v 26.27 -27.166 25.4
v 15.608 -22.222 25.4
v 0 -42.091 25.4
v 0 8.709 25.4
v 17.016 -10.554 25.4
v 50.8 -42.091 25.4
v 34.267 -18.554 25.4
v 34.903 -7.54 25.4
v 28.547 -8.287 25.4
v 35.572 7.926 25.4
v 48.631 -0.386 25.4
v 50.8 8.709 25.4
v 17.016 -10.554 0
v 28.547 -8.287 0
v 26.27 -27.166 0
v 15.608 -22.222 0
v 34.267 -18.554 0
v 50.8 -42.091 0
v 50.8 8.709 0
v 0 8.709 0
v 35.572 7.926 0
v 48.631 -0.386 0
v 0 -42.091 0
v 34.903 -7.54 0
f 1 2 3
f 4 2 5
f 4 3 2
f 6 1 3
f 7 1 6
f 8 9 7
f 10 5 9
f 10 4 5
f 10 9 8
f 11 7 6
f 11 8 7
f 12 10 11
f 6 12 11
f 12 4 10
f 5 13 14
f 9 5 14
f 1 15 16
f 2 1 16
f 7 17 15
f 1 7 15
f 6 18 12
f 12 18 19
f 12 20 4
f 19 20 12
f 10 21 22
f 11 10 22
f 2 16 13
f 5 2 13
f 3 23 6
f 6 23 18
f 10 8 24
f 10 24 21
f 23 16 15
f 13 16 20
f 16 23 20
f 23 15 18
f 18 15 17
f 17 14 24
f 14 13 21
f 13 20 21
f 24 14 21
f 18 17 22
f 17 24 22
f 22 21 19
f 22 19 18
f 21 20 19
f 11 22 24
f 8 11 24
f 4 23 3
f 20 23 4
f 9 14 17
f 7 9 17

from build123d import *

# Parameters (mm, degrees)
F0_W     = 50.8
F0_H     = 50.8
F1_DEPTH = 25.4
F2_DEPTH = 25.4


# Not quite as in the source:
# - a feature names something its author has since deleted; it is built from what else it names


with BuildPart() as f1:
    # F0 (on Top) → F1 (new body)
    with BuildSketch(Plane.XY):
        with Locations((25.4, -16.6914236449)):
            Rectangle(F0_W, F0_H)
        Polygon((28.5474364771, -8.2873642427), (34.2667401254, -18.5540249534), (26.2699275792, -27.1659785919), (15.6083219757, -22.2217979392), (17.0158998843, -10.5541726109), align=None, mode=Mode.SUBTRACT)
        Polygon((35.5715639889, 7.9258885235), (48.6309623563, -0.3860413606), (34.9029207385, -7.5398471628), align=None, mode=Mode.SUBTRACT)
    extrude(amount=F1_DEPTH)

    # F0 (on Top) → F2 (join)
    with BuildSketch(Plane.XY):
        with Locations((25.4, -16.6914236449)):
            Rectangle(F0_W, F0_H)
        Polygon((28.5474364771, -8.2873642427), (34.2667401254, -18.5540249534), (26.2699275792, -27.1659785919), (15.6083219757, -22.2217979392), (17.0158998843, -10.5541726109), align=None, mode=Mode.SUBTRACT)
        Polygon((35.5715639889, 7.9258885235), (48.6309623563, -0.3860413606), (34.9029207385, -7.5398471628), align=None, mode=Mode.SUBTRACT)
    extrude(amount=F2_DEPTH)


solid = f1.part
